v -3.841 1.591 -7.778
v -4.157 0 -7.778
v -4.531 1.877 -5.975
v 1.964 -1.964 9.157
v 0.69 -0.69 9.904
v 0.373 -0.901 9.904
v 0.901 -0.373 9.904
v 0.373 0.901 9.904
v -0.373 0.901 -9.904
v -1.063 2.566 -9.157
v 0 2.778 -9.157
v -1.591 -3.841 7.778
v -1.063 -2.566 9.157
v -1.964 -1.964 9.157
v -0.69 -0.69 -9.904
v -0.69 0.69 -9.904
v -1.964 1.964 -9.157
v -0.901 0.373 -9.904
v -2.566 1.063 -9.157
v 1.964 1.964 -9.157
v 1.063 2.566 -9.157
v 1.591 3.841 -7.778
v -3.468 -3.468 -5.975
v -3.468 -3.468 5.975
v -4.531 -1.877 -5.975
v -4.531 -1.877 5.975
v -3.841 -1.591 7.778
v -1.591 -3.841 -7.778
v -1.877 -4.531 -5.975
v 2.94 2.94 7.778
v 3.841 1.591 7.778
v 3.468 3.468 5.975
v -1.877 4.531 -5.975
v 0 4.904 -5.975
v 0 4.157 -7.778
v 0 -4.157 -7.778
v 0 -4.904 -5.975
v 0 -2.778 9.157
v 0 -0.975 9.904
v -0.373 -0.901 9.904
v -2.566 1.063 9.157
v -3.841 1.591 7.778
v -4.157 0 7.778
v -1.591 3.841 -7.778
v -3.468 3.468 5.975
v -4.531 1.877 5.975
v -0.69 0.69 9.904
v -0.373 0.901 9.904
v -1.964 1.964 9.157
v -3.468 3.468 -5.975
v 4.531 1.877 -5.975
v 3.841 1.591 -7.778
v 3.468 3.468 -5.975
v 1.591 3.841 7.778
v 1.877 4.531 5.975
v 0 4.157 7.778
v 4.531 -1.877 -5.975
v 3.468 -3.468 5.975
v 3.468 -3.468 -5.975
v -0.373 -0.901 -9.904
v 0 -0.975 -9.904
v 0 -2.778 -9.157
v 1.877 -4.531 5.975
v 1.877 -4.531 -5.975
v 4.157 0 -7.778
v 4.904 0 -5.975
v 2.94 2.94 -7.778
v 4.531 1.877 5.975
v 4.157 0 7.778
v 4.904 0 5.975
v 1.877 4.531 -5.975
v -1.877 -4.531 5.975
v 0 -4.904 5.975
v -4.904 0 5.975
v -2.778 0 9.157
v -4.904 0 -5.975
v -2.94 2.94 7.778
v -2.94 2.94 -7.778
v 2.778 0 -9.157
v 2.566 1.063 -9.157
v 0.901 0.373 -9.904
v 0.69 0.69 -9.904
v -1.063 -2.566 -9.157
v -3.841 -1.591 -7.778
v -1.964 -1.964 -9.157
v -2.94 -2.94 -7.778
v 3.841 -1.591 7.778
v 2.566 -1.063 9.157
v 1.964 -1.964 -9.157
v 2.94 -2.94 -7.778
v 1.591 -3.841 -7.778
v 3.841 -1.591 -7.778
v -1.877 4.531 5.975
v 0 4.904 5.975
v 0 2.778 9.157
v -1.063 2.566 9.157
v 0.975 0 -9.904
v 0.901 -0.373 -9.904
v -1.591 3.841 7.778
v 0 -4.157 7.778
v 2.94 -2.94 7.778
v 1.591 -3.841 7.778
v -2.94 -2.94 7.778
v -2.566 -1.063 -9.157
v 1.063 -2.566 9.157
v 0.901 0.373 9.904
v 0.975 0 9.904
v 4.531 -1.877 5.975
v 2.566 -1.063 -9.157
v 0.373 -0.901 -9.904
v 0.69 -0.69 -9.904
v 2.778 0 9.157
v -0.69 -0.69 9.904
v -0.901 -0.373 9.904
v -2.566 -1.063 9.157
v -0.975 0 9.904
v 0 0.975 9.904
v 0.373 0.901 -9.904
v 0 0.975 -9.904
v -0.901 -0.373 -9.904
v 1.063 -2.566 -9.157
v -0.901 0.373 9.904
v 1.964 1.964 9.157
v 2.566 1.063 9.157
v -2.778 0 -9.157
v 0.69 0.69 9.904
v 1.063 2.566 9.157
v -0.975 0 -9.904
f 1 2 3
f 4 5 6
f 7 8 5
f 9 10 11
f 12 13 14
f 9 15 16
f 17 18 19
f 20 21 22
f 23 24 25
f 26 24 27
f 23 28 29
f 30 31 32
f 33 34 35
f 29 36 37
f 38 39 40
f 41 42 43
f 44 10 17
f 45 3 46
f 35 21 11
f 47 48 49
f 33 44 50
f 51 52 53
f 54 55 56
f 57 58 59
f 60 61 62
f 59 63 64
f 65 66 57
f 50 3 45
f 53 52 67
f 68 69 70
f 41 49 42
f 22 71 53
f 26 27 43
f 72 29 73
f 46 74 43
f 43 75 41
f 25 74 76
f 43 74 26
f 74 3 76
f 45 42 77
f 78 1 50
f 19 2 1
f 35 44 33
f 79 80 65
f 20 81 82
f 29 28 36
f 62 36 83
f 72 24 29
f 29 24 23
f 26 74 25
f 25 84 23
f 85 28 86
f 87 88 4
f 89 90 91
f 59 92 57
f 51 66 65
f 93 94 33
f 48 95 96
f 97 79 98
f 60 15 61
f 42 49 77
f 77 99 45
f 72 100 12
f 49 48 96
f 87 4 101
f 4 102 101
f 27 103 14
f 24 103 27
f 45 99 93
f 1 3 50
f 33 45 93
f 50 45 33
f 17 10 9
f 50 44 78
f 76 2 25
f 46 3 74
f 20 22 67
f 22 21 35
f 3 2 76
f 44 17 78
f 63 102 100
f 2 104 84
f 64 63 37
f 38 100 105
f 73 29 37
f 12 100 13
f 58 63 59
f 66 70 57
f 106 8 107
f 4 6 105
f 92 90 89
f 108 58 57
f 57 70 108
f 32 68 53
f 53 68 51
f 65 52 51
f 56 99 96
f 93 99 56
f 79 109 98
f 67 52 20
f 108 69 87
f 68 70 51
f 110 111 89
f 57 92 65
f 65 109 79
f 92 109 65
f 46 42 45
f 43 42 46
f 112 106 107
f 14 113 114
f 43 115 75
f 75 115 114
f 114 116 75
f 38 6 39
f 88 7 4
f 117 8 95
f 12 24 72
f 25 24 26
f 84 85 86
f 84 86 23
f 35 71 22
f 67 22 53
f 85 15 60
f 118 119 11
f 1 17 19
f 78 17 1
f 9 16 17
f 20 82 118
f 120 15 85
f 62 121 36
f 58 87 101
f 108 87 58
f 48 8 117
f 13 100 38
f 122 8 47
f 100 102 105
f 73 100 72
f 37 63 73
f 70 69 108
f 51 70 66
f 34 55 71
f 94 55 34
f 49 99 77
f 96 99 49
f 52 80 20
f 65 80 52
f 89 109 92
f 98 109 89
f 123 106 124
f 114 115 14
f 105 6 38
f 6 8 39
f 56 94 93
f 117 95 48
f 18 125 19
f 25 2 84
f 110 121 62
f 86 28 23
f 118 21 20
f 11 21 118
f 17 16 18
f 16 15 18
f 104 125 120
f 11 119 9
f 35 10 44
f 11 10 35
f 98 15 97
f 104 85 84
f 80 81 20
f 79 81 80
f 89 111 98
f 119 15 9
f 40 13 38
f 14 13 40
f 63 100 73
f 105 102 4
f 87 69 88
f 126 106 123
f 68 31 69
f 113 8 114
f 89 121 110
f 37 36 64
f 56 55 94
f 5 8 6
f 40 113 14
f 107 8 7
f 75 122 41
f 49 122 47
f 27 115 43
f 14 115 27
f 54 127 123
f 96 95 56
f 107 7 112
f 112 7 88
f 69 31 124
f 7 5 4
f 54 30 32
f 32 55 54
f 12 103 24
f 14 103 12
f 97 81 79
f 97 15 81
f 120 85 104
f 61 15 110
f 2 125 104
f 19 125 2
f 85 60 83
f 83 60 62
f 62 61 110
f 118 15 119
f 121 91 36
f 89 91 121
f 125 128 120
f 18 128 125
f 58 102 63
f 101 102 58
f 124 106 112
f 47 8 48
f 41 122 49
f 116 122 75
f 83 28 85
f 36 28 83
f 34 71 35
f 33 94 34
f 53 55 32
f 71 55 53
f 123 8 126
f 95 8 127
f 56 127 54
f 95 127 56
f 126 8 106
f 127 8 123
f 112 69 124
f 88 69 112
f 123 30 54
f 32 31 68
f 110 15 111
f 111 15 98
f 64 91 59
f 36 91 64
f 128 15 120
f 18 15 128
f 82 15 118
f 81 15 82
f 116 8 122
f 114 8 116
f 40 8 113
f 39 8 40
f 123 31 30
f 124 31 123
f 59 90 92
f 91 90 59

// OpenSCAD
/* Pill Object, Loic August 2017 */

pill(20,10);

module pill(height,width)
{
       move = (height - width) / 2;
       cyl_height = height - width;
       cyl_move = -move;
    
    hull()
    {
        translate([0,0,-move]) 
            sphere(width/2);

        translate([0,0,move]) 
            sphere(width/2);
    }
}
